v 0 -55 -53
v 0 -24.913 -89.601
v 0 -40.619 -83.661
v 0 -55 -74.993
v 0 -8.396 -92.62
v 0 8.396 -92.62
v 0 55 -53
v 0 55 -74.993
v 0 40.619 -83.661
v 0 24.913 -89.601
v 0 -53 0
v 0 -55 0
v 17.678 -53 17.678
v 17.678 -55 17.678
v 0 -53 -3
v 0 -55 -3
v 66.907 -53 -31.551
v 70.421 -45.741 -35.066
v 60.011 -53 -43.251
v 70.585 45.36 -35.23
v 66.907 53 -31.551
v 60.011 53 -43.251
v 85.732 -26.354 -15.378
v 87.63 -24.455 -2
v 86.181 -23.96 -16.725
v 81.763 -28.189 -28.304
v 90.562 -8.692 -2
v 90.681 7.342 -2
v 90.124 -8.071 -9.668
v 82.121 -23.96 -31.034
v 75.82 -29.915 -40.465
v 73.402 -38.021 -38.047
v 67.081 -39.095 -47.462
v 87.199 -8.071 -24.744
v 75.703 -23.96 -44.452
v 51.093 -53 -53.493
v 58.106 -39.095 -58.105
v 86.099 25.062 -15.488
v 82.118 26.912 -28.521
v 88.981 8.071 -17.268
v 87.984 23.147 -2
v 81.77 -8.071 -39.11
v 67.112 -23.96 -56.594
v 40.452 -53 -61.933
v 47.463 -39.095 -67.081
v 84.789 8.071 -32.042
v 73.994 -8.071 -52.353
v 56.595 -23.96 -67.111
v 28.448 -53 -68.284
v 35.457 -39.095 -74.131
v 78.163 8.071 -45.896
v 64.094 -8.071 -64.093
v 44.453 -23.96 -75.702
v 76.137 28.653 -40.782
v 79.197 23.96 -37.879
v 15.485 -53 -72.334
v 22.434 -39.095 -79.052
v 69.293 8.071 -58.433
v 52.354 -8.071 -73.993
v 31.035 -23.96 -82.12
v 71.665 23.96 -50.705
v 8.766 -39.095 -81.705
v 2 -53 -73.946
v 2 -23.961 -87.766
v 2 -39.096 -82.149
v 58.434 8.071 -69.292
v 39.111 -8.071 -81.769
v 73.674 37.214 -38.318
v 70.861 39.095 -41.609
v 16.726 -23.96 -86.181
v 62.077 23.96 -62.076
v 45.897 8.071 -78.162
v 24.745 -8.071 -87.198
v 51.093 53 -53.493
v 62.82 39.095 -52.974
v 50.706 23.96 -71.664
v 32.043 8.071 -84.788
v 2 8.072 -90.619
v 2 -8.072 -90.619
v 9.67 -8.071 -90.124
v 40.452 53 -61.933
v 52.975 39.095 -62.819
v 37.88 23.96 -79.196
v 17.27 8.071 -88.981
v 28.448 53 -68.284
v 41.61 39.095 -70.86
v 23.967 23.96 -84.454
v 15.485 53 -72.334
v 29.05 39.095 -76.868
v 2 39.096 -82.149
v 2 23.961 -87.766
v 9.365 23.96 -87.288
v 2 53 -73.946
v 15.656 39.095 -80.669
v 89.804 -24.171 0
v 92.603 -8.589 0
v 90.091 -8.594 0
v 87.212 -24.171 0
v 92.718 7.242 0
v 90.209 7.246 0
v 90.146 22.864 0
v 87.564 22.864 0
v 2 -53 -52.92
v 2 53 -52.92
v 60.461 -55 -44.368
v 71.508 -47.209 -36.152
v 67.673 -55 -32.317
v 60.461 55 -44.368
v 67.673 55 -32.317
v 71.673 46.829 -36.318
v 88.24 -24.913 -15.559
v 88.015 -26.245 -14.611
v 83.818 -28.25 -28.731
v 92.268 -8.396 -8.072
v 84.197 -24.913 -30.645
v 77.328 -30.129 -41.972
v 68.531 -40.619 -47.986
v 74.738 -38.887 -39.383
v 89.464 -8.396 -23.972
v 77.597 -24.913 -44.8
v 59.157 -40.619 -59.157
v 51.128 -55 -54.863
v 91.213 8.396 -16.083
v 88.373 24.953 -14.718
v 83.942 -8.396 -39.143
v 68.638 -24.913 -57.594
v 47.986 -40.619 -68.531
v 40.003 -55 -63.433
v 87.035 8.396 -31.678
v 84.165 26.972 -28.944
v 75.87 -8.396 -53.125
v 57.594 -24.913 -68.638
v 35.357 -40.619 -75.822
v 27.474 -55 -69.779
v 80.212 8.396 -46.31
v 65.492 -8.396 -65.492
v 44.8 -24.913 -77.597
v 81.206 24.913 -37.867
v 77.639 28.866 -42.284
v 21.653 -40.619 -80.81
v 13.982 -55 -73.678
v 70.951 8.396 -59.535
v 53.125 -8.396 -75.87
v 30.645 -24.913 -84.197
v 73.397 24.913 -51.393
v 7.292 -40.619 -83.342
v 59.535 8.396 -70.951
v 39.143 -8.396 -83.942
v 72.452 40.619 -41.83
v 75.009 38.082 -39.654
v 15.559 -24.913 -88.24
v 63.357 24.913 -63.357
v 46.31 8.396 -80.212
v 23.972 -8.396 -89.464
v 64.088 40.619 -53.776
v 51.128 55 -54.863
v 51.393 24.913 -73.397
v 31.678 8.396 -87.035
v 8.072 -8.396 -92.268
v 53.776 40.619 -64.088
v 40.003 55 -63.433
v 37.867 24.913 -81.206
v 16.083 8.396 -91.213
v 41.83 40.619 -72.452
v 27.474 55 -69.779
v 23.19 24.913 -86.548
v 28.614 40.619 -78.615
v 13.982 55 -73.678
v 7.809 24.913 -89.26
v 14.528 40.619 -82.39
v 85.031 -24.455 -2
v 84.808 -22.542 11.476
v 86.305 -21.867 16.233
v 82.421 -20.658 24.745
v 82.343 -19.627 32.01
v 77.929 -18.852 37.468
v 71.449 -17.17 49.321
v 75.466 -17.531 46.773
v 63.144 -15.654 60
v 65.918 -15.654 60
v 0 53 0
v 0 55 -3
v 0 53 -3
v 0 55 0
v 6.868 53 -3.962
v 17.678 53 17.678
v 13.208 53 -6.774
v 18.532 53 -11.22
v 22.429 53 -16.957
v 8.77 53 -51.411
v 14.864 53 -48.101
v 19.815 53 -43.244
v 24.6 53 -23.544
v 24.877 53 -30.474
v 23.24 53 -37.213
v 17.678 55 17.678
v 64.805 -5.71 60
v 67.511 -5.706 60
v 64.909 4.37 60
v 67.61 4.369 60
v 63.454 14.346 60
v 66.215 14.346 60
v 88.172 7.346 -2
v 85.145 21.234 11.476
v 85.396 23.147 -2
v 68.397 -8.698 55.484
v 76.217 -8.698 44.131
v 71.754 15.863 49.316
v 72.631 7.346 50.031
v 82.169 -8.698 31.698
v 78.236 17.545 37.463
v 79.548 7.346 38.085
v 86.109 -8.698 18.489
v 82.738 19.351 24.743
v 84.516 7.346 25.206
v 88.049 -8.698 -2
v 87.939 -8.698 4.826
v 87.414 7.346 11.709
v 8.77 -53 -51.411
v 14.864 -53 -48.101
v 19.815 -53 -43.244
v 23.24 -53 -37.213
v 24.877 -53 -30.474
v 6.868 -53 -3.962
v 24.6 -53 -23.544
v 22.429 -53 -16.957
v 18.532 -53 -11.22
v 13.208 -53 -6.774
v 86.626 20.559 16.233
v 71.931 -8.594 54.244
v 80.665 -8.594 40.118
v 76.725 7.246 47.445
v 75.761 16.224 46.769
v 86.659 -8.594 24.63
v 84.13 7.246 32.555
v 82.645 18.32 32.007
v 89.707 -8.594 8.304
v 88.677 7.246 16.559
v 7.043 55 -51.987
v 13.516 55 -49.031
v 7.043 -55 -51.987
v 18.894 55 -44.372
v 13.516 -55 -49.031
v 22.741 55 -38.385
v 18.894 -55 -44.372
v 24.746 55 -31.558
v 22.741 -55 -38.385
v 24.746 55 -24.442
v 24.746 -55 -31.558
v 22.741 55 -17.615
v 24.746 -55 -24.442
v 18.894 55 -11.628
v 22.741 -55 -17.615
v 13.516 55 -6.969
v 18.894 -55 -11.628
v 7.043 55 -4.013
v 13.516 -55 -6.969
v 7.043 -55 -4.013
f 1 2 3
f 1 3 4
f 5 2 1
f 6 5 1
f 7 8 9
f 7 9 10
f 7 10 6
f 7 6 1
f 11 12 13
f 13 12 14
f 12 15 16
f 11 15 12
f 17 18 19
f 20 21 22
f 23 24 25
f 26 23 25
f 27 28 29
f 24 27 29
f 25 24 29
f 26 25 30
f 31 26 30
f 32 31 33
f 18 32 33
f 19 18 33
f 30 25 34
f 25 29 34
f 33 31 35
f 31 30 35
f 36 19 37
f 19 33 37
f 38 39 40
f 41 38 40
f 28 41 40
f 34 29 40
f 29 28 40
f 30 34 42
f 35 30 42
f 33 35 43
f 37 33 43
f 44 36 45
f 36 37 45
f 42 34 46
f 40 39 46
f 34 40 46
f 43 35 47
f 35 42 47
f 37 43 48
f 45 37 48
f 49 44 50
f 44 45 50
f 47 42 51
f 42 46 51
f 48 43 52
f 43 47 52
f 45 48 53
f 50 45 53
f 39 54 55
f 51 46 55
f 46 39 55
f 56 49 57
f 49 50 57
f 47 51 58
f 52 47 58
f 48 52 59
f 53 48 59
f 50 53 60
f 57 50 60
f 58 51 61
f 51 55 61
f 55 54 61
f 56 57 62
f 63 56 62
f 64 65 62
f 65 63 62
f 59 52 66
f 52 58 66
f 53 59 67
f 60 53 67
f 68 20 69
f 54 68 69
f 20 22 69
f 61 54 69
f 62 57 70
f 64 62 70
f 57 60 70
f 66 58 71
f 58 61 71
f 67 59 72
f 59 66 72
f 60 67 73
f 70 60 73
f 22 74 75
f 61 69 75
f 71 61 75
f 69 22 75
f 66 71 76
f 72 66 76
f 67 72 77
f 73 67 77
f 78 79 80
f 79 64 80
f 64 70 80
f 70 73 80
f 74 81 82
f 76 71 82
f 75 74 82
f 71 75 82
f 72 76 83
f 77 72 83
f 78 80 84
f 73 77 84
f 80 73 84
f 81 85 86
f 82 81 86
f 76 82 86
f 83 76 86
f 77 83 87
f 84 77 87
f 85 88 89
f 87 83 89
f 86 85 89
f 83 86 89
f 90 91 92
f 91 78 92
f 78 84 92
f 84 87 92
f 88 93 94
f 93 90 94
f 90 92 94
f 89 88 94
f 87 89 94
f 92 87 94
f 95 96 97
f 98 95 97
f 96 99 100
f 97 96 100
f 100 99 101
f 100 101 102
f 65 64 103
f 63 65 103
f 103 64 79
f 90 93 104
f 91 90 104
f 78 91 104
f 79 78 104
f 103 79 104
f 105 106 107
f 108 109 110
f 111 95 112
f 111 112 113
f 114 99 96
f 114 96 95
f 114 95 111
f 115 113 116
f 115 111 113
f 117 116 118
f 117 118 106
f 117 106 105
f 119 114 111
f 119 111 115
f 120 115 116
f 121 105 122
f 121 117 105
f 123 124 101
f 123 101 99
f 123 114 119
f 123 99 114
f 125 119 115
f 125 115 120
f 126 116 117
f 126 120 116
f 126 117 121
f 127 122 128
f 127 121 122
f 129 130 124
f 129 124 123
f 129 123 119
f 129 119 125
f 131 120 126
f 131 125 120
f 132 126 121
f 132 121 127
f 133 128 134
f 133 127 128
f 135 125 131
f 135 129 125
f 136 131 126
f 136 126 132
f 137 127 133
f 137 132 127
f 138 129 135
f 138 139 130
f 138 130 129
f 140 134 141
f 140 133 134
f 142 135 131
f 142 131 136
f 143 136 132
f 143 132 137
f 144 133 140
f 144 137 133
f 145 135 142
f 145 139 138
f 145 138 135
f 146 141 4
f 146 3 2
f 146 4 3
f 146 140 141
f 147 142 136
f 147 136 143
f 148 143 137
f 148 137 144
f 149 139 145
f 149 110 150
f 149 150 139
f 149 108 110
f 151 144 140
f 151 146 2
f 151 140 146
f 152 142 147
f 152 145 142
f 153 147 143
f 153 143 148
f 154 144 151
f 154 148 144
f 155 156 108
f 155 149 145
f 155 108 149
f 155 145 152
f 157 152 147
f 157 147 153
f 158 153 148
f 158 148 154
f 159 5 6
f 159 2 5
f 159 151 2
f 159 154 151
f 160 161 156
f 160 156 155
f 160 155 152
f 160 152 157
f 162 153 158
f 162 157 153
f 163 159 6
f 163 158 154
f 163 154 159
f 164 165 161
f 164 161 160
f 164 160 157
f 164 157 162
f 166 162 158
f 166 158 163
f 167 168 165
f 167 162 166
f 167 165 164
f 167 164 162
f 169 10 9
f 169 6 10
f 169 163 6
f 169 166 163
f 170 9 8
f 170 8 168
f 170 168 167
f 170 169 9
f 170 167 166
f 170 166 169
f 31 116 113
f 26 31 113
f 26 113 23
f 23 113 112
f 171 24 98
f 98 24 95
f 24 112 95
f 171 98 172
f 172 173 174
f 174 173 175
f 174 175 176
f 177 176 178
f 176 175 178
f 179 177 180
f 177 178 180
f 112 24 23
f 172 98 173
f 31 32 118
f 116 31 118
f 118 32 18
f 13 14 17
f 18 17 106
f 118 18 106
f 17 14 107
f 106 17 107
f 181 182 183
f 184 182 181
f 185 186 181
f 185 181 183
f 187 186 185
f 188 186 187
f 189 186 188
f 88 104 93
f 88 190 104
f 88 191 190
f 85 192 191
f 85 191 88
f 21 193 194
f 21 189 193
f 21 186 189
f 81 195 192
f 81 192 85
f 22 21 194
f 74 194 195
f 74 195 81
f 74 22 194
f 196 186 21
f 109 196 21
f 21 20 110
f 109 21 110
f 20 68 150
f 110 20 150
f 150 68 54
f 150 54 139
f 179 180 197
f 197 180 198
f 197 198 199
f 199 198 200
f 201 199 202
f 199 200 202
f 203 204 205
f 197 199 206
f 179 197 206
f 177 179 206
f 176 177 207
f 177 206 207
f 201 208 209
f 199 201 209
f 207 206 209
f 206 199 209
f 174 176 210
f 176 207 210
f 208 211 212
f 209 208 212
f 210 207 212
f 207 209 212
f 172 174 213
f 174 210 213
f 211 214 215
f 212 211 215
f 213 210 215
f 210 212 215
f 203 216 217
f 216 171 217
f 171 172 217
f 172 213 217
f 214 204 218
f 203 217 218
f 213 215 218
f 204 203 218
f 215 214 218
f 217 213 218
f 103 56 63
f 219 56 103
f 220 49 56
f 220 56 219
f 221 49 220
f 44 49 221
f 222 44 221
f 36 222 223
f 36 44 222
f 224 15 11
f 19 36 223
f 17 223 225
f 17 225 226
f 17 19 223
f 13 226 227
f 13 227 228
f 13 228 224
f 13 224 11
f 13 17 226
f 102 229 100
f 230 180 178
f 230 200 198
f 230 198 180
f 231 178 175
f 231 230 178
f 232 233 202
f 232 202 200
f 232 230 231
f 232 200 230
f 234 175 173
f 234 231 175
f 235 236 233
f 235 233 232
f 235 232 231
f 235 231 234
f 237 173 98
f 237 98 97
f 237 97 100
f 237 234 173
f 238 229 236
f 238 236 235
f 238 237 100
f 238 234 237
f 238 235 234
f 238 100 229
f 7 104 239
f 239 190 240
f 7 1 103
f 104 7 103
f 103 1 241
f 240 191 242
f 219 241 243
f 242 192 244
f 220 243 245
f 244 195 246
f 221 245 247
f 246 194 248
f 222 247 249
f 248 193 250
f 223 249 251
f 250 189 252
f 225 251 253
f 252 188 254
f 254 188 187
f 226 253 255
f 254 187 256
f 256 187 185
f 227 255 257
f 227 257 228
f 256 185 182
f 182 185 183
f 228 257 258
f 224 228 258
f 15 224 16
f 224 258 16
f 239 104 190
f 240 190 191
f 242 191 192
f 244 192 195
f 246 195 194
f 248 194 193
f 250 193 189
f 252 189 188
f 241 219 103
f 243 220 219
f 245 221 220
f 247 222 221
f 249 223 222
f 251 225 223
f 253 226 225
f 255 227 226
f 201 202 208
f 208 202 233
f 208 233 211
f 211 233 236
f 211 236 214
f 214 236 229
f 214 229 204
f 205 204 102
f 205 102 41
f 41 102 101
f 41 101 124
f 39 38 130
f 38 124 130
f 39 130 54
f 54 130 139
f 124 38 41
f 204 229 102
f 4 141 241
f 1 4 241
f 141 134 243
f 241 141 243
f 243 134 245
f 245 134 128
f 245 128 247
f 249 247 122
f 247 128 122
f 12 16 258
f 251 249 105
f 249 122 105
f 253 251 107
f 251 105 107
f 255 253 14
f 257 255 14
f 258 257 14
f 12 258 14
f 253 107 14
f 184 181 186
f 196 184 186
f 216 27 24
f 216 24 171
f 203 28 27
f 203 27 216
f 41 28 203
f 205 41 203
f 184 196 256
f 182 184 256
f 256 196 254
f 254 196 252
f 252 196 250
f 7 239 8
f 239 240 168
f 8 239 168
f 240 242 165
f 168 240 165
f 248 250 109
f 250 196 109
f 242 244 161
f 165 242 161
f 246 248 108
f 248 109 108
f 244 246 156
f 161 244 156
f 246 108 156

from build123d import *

# Parameters (mm, degrees)
OBR_T1_ANGLE                = 180.0000000000004
WYTNIJ_WYCI_GNI_CIE6_DEPTH  = 172.4642819948225
WYTNIJ_WYCI_GNI_CIE7_DEPTH  = 166.27116841238856
DODANIE_WYCI_GNI_CIE2_DEPTH = 100
WYTNIJ_WYCI_GNI_CIE8_DEPTH  = 172.45844977719824
WYCI_CIE_OBR_T2_ANGLE       = 90.0000000000002
WYTNIJ_WYCI_GNI_CIE9_DEPTH  = 172.45844977719824
SKORUPA2_T                  = -2


with BuildPart() as part:
    # Szkic1 → Obrót1 (revolve)
    with BuildSketch(Plane(origin=(0, 0, 0), x_dir=(0, 0, -1), z_dir=(1, 0, 0))):
        with BuildLine():
            Line((0, -55), (0, 55))
            Line((0, 55), (-75, 54.99999999999999))
            ThreePointArc((-75, 54.99999999999999), (-93.00537618869137, 1.139e-14), (-75, -54.99999999999999))
            Line((-75, -54.99999999999999), (0, -55))
        make_face()
    revolve(axis=Axis((0, -55, 0), (0, 1, 0)), revolution_arc=OBR_T1_ANGLE)

    # Szkic2 → Wytnij-wyciągnięcie6 (cut, through all)
    with BuildSketch(Plane.XZ.offset(54.99999999999998)):
        with BuildLine():
            Line((-50.14037658161271, 0), (-26.065901524307794, 0))
            Line((-26.065901524307794, 0), (-26.065901524307794, 75.00000000000003))
            Line((-26.065901524307794, 75.00000000000003), (0, 75.00000000000003))
            ThreePointArc((-7.11e-15, 75.00000000000004), (6.164498496803606, 74.74623039513706), (12.28728066433489, 73.98663888754419))
            ThreePointArc((12.287280664334872, 73.9866388875442), (66.51313822370639, 34.6554821584426), (67.6776695296636, -32.32233047033656))
            Line((67.6776695296636, -32.32233047033656), (87.35369951614506, -51.99836045681815))
            Line((87.35369951614506, -51.99836045681814), (99.7170587397922, -51.99836045681808))
            Line((99.7170587397922, -51.99836045681808), (99.7170587397922, 112.3930651923552))
            Line((99.71705873979221, 112.3930651923552), (-50.14037658161271, 112.3930651923552))
            Line((-50.14037658161271, 112.3930651923552), (-50.14037658161271, 0))
        make_face()
    extrude(amount=-WYTNIJ_WYCI_GNI_CIE6_DEPTH, mode=Mode.SUBTRACT)

    # Szkic6 → Wytnij-wyciągnięcie7 (cut, through all)
    with BuildSketch(Plane.XZ.offset(54.99999999999998)):
        with BuildLine():
            ThreePointArc((67.67766952966359, -32.32233047033659), (63.4396358173472, 40.00515725956293), (5.5067e-13, 75.00000000000003))
            Line((5.375e-13, 75.00000000000003), (-4.59e-15, 0))
            Line((0, 0), (17.677669529663717, 17.67766952966366))
            Line((17.677669529663717, 17.67766952966366), (67.6776695296636, -32.32233047033657))
        make_face()
    extrude(amount=-WYTNIJ_WYCI_GNI_CIE7_DEPTH, mode=Mode.SUBTRACT)

    # Szkic7 → Dodanie-wyciągnięcie2 (add)
    with BuildSketch(Plane(origin=(100, 0, 0), x_dir=(0, 0, -1), z_dir=(1, 0, 0))):
        Polygon((-60, -15.653786999192038), (-60, 14.34621300080796), (45.666627766936244, 29.346213000808905), (45.666627766936244, -30.653786999192953), align=None)
    extrude(amount=-DODANIE_WYCI_GNI_CIE2_DEPTH)

    # Szkic8 → Wycięcie-obrót1 (revolve, cut)
    with BuildSketch(Plane(origin=(0, 0, 0), x_dir=(0, 0, -1), z_dir=(1, 0, 0))):
        with BuildLine():
            Line((-74.9933330370107, 55.00000000000001), (-155.56349186104046, 55.00000000000001))
            ThreePointArc((-155.56349186104046, 55.00000000000001), (-165, 2.021e-14), (-155.56349186104046, -54.999999999999964))
            Line((-155.56349186104046, -54.999999999999964), (-74.99333303701071, -54.99999999999997))
            ThreePointArc((-74.99333303701071, -54.99999999999997), (-93, 1.139e-14), (-74.9933330370107, 55.00000000000001))
        make_face()
    revolve(axis=Axis((0, 0, 0), (0, 1, 0)), mode=Mode.SUBTRACT)

    # Szkic9 → Wytnij-wyciągnięcie8 (cut, through all)
    with BuildSketch(Plane.XZ.offset(54.99999999999998)):
        Polygon((-4.3e-16, -4.3e-16), (84.28181453760202, 84.28181453760173), (-46.691543450070924, 84.28181453760173), (-46.691543450070924, 0), align=None)
    extrude(amount=-WYTNIJ_WYCI_GNI_CIE8_DEPTH, mode=Mode.SUBTRACT)

    # Szkic10 → Wycięcie-obrót2 (revolve, cut)
    with BuildSketch(Plane(origin=(0, 0, 0), x_dir=(0, 0, -1), z_dir=(1, 0, 0))):
        with BuildLine():
            Line((-71.86967371569179, 55.00000000000001), (-106.6536450385077, 55.00000000000001))
            ThreePointArc((-106.6536450385077, 55.00000000000001), (-120, 1.47e-14), (-106.65364503850772, -54.99999999999998))
            Line((-106.65364503850772, -54.99999999999998), (-71.8696737156918, -54.99999999999998))
            ThreePointArc((-71.8696737156918, -54.99999999999998), (-90.5, 1.108e-14), (-71.86967371569179, 55.00000000000001))
        make_face()
    revolve(axis=Axis((0, 0, 0), (0, 1, 0)), revolution_arc=WYCI_CIE_OBR_T2_ANGLE, mode=Mode.SUBTRACT)

    # Szkic11 → Wytnij-wyciągnięcie9 (cut, through all)
    with BuildSketch(Plane.XZ.offset(54.99999999999998)):
        with BuildLine():
            ThreePointArc((25.000000000000004, -28), (17.67766952966355, -10.32233047033617), (-3.9815e-13, -2.9999999999999964))
            Line((0, -2.9999999999999964), (0, -28))
            Line((-1.9552e-13, -28), (-3.701e-13, -53))
            ThreePointArc((-6.7073e-13, -53), (17.67766952966345, -45.67766952966393), (25.000000000000004, -28.000000000000007))
        make_face()
        with BuildLine():
            Line((0, -28), (0, -2.9999999999999964))
            ThreePointArc((-3.9815e-13, -2.9999999999999964), (-25.000000000000004, -27.999999999999865), (-6.7073e-13, -53))
            Line((-3.701e-13, -53), (-1.9552e-13, -28))
        make_face()
    extrude(amount=-WYTNIJ_WYCI_GNI_CIE9_DEPTH, mode=Mode.SUBTRACT)

    # Skorupa2
    skorupa2_openings = [part.faces().sort_by_distance(p)[0] for p in [
        (63.613171512, -0.551610376, 60),
        (25, 0, -28),
        (21.502764512, -0.287252782, 21.502764512),
        (60.525104479, -22.455388981, 12.086510343),
        (60.727668941, 21.157570461, 12.017788444),
        (44.39246987, 39.229169277, -9.037130811),
        (0, 0, -1.5),
        (44.239594619, -39.899256445, -8.88425556),
    ]]
    offset(amount=SKORUPA2_T, openings=skorupa2_openings, kind=Kind.INTERSECTION)


solid = part.part
